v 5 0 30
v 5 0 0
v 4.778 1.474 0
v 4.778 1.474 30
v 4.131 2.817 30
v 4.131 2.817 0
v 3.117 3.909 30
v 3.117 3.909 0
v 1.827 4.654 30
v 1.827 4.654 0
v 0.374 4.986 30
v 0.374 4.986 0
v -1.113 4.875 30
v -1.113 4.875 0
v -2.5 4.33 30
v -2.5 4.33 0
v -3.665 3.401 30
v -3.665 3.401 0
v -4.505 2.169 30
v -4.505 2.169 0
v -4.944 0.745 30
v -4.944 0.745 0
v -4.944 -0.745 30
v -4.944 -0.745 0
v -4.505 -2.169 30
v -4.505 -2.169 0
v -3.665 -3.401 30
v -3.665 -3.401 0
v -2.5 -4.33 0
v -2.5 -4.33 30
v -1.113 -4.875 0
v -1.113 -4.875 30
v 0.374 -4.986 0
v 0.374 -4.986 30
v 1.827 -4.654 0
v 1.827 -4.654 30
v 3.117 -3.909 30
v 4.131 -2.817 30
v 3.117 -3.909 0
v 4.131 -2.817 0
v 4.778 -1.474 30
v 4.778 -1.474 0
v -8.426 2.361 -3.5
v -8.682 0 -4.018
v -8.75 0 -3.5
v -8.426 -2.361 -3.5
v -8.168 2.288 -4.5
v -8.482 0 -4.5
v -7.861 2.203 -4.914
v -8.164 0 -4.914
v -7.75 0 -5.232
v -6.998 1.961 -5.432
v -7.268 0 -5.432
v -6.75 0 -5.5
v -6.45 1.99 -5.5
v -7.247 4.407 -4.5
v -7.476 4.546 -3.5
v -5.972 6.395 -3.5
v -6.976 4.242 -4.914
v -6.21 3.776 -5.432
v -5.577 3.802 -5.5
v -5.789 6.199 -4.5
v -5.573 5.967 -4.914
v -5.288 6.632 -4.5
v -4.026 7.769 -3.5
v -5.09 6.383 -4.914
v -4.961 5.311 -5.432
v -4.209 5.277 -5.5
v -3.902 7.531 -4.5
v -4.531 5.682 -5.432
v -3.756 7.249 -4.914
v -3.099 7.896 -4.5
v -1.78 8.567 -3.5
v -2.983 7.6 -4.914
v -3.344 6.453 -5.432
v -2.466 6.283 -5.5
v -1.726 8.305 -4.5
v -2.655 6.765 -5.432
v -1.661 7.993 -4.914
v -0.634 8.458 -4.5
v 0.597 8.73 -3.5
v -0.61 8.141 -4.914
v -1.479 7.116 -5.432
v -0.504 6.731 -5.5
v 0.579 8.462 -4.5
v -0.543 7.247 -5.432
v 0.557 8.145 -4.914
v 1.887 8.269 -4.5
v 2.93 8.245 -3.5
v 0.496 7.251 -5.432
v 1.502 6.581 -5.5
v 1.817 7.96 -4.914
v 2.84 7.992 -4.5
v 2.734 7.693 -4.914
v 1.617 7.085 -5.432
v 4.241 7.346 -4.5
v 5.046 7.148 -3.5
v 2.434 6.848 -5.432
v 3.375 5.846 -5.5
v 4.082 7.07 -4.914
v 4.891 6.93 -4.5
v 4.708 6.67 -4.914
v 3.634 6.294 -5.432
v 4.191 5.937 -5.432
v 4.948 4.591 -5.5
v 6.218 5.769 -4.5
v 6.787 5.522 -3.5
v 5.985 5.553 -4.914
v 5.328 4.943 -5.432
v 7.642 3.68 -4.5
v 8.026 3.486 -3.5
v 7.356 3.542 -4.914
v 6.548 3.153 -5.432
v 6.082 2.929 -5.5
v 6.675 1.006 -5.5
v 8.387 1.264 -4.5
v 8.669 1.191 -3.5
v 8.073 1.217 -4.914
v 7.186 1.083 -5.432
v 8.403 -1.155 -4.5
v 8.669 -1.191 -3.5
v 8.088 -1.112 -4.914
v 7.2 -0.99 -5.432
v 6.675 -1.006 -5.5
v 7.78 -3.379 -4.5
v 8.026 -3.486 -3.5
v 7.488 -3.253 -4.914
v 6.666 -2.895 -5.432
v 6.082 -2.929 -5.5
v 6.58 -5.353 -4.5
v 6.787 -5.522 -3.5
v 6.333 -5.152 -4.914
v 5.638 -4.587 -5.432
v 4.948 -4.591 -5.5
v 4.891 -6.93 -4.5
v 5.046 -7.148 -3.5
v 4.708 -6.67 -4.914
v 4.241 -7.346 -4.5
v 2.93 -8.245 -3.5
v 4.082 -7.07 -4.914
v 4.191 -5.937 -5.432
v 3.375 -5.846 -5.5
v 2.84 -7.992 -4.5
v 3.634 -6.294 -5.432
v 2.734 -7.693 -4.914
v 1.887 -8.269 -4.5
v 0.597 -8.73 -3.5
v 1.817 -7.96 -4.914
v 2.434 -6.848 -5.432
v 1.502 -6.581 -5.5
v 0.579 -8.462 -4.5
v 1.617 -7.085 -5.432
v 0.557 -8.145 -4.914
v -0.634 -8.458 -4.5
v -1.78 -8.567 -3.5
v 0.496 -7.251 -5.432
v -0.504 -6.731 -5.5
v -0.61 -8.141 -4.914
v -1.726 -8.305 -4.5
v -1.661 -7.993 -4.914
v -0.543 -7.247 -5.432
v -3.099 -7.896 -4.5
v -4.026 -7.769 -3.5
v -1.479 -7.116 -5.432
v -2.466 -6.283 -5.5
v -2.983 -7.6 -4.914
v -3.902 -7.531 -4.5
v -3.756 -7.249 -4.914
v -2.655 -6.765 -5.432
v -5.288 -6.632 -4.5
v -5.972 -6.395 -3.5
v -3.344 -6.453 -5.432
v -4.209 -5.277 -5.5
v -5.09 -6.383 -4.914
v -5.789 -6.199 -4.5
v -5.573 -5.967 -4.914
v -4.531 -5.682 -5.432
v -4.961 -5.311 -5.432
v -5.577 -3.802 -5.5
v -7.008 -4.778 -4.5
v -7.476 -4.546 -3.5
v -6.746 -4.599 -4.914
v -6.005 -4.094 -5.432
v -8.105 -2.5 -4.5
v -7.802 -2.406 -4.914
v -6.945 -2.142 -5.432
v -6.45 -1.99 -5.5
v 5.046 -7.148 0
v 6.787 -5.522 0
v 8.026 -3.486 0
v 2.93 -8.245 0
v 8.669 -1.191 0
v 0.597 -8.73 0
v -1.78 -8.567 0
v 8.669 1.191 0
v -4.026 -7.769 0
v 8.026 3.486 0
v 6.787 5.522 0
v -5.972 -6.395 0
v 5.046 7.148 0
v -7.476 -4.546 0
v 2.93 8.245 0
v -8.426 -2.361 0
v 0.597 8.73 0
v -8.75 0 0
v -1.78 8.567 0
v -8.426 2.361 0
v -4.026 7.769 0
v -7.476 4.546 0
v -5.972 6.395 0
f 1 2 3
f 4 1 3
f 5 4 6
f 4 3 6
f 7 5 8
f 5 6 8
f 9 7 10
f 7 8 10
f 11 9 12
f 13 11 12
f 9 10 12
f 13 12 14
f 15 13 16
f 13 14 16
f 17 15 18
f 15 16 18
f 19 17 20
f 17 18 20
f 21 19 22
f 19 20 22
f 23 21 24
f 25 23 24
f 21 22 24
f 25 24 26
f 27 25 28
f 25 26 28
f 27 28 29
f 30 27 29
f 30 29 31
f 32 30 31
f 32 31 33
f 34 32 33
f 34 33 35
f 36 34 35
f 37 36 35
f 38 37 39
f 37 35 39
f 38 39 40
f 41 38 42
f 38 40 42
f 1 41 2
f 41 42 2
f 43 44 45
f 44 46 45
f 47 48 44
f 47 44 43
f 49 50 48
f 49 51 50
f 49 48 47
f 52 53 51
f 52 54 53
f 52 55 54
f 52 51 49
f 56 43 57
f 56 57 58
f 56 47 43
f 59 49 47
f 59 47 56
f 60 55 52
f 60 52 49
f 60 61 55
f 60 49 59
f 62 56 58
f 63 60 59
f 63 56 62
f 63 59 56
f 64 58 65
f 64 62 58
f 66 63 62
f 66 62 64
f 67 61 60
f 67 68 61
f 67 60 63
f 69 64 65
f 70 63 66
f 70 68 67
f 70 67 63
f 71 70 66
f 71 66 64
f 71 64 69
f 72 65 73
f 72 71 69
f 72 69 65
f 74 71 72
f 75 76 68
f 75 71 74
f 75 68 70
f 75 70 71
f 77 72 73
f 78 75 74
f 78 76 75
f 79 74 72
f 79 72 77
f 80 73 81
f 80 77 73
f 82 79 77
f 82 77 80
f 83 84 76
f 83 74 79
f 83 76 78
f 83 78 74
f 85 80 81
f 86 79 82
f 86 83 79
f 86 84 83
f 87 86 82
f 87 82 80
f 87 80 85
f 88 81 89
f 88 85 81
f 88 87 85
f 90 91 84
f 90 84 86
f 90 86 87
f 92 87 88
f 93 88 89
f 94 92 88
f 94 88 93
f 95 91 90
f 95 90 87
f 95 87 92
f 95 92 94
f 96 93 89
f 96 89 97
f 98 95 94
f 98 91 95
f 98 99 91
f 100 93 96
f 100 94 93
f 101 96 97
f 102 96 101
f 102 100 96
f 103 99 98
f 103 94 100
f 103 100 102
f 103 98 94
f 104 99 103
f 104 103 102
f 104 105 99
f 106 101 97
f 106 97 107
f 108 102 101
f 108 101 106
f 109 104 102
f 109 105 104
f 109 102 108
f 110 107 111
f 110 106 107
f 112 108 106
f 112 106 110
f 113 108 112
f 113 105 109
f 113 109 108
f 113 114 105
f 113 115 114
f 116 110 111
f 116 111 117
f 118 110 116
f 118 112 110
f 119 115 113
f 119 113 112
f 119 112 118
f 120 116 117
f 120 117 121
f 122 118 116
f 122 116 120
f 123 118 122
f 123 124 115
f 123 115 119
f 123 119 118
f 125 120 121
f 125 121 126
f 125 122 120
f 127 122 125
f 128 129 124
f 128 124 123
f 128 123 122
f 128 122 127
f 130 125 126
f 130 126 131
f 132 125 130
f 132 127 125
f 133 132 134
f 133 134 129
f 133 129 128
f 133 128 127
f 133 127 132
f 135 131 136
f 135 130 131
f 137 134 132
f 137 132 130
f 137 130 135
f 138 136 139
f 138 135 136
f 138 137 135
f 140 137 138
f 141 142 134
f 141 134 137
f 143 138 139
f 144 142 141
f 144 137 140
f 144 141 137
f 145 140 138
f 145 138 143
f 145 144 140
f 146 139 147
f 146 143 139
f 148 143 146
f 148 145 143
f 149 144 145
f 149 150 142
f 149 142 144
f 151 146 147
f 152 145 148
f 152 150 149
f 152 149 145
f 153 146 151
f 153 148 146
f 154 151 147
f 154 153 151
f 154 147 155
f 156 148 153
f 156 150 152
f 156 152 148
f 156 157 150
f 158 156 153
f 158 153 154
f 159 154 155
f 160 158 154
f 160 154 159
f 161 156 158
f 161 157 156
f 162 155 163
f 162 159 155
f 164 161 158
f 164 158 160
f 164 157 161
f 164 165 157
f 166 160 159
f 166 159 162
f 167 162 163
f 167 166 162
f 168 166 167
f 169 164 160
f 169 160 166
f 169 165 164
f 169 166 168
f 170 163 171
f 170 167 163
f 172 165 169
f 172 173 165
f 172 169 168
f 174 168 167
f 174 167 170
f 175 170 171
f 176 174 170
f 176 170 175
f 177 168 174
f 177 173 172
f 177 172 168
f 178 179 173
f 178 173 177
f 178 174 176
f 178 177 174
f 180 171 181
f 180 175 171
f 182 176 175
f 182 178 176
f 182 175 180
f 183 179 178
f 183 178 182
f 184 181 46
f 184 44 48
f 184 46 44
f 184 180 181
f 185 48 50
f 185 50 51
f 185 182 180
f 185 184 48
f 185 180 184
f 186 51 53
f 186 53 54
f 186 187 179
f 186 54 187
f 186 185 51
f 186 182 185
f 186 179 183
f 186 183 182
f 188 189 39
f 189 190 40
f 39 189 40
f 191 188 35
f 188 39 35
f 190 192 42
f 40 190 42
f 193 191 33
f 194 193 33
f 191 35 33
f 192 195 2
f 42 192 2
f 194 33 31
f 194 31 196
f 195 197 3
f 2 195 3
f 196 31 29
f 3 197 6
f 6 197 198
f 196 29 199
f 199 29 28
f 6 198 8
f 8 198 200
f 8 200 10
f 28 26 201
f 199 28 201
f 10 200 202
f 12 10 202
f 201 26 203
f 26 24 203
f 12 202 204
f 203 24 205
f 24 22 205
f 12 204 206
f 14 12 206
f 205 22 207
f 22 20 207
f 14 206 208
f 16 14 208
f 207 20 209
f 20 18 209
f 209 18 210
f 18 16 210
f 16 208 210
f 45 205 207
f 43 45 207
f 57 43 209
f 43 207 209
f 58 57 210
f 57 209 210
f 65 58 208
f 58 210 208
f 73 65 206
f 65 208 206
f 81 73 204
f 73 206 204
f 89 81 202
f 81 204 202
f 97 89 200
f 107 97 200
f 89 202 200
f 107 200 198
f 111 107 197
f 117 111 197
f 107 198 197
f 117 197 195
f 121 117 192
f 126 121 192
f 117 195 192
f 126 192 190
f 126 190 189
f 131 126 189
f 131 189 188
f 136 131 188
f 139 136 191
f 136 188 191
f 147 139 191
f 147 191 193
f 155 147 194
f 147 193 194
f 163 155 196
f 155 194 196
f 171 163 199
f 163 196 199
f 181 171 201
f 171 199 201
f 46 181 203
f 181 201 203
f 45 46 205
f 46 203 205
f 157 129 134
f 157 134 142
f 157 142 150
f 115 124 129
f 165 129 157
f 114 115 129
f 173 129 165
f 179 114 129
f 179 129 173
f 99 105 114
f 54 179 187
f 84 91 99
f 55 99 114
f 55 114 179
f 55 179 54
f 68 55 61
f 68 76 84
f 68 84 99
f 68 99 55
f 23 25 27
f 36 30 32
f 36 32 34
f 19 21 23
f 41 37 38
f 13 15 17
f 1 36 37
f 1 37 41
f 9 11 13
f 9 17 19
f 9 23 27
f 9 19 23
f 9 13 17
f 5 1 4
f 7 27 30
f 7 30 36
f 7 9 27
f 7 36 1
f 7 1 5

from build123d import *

# Parameters (mm, degrees)
SKETCH_1_R      = 5
EXTRUDE_1_DEPTH = 30
SKETCH_2_R      = 8.75
EXTRUDE_2_DEPTH = 5.5
FILLET_2_R      = 2


with BuildPart() as part:
    # 草图1 → 凸台-拉伸1 (new body)
    with BuildSketch(Plane.XY):
        Circle(SKETCH_1_R)
    extrude(amount=EXTRUDE_1_DEPTH)

    # Sketch 2 → 凸台-拉伸2 (add)
    with BuildSketch(Plane(origin=(0, 0, 0), x_dir=(-1, 0, 0), z_dir=(0, 0, -1))):
        Circle(SKETCH_2_R)
    extrude(amount=EXTRUDE_2_DEPTH)

    # 圆角2
    fillet_2_edges = [part.edges().sort_by_distance(p)[0] for p in [
        (8.75, 0, -5.5),
    ]]
    fillet(fillet_2_edges, radius=FILLET_2_R)


solid = part.part
